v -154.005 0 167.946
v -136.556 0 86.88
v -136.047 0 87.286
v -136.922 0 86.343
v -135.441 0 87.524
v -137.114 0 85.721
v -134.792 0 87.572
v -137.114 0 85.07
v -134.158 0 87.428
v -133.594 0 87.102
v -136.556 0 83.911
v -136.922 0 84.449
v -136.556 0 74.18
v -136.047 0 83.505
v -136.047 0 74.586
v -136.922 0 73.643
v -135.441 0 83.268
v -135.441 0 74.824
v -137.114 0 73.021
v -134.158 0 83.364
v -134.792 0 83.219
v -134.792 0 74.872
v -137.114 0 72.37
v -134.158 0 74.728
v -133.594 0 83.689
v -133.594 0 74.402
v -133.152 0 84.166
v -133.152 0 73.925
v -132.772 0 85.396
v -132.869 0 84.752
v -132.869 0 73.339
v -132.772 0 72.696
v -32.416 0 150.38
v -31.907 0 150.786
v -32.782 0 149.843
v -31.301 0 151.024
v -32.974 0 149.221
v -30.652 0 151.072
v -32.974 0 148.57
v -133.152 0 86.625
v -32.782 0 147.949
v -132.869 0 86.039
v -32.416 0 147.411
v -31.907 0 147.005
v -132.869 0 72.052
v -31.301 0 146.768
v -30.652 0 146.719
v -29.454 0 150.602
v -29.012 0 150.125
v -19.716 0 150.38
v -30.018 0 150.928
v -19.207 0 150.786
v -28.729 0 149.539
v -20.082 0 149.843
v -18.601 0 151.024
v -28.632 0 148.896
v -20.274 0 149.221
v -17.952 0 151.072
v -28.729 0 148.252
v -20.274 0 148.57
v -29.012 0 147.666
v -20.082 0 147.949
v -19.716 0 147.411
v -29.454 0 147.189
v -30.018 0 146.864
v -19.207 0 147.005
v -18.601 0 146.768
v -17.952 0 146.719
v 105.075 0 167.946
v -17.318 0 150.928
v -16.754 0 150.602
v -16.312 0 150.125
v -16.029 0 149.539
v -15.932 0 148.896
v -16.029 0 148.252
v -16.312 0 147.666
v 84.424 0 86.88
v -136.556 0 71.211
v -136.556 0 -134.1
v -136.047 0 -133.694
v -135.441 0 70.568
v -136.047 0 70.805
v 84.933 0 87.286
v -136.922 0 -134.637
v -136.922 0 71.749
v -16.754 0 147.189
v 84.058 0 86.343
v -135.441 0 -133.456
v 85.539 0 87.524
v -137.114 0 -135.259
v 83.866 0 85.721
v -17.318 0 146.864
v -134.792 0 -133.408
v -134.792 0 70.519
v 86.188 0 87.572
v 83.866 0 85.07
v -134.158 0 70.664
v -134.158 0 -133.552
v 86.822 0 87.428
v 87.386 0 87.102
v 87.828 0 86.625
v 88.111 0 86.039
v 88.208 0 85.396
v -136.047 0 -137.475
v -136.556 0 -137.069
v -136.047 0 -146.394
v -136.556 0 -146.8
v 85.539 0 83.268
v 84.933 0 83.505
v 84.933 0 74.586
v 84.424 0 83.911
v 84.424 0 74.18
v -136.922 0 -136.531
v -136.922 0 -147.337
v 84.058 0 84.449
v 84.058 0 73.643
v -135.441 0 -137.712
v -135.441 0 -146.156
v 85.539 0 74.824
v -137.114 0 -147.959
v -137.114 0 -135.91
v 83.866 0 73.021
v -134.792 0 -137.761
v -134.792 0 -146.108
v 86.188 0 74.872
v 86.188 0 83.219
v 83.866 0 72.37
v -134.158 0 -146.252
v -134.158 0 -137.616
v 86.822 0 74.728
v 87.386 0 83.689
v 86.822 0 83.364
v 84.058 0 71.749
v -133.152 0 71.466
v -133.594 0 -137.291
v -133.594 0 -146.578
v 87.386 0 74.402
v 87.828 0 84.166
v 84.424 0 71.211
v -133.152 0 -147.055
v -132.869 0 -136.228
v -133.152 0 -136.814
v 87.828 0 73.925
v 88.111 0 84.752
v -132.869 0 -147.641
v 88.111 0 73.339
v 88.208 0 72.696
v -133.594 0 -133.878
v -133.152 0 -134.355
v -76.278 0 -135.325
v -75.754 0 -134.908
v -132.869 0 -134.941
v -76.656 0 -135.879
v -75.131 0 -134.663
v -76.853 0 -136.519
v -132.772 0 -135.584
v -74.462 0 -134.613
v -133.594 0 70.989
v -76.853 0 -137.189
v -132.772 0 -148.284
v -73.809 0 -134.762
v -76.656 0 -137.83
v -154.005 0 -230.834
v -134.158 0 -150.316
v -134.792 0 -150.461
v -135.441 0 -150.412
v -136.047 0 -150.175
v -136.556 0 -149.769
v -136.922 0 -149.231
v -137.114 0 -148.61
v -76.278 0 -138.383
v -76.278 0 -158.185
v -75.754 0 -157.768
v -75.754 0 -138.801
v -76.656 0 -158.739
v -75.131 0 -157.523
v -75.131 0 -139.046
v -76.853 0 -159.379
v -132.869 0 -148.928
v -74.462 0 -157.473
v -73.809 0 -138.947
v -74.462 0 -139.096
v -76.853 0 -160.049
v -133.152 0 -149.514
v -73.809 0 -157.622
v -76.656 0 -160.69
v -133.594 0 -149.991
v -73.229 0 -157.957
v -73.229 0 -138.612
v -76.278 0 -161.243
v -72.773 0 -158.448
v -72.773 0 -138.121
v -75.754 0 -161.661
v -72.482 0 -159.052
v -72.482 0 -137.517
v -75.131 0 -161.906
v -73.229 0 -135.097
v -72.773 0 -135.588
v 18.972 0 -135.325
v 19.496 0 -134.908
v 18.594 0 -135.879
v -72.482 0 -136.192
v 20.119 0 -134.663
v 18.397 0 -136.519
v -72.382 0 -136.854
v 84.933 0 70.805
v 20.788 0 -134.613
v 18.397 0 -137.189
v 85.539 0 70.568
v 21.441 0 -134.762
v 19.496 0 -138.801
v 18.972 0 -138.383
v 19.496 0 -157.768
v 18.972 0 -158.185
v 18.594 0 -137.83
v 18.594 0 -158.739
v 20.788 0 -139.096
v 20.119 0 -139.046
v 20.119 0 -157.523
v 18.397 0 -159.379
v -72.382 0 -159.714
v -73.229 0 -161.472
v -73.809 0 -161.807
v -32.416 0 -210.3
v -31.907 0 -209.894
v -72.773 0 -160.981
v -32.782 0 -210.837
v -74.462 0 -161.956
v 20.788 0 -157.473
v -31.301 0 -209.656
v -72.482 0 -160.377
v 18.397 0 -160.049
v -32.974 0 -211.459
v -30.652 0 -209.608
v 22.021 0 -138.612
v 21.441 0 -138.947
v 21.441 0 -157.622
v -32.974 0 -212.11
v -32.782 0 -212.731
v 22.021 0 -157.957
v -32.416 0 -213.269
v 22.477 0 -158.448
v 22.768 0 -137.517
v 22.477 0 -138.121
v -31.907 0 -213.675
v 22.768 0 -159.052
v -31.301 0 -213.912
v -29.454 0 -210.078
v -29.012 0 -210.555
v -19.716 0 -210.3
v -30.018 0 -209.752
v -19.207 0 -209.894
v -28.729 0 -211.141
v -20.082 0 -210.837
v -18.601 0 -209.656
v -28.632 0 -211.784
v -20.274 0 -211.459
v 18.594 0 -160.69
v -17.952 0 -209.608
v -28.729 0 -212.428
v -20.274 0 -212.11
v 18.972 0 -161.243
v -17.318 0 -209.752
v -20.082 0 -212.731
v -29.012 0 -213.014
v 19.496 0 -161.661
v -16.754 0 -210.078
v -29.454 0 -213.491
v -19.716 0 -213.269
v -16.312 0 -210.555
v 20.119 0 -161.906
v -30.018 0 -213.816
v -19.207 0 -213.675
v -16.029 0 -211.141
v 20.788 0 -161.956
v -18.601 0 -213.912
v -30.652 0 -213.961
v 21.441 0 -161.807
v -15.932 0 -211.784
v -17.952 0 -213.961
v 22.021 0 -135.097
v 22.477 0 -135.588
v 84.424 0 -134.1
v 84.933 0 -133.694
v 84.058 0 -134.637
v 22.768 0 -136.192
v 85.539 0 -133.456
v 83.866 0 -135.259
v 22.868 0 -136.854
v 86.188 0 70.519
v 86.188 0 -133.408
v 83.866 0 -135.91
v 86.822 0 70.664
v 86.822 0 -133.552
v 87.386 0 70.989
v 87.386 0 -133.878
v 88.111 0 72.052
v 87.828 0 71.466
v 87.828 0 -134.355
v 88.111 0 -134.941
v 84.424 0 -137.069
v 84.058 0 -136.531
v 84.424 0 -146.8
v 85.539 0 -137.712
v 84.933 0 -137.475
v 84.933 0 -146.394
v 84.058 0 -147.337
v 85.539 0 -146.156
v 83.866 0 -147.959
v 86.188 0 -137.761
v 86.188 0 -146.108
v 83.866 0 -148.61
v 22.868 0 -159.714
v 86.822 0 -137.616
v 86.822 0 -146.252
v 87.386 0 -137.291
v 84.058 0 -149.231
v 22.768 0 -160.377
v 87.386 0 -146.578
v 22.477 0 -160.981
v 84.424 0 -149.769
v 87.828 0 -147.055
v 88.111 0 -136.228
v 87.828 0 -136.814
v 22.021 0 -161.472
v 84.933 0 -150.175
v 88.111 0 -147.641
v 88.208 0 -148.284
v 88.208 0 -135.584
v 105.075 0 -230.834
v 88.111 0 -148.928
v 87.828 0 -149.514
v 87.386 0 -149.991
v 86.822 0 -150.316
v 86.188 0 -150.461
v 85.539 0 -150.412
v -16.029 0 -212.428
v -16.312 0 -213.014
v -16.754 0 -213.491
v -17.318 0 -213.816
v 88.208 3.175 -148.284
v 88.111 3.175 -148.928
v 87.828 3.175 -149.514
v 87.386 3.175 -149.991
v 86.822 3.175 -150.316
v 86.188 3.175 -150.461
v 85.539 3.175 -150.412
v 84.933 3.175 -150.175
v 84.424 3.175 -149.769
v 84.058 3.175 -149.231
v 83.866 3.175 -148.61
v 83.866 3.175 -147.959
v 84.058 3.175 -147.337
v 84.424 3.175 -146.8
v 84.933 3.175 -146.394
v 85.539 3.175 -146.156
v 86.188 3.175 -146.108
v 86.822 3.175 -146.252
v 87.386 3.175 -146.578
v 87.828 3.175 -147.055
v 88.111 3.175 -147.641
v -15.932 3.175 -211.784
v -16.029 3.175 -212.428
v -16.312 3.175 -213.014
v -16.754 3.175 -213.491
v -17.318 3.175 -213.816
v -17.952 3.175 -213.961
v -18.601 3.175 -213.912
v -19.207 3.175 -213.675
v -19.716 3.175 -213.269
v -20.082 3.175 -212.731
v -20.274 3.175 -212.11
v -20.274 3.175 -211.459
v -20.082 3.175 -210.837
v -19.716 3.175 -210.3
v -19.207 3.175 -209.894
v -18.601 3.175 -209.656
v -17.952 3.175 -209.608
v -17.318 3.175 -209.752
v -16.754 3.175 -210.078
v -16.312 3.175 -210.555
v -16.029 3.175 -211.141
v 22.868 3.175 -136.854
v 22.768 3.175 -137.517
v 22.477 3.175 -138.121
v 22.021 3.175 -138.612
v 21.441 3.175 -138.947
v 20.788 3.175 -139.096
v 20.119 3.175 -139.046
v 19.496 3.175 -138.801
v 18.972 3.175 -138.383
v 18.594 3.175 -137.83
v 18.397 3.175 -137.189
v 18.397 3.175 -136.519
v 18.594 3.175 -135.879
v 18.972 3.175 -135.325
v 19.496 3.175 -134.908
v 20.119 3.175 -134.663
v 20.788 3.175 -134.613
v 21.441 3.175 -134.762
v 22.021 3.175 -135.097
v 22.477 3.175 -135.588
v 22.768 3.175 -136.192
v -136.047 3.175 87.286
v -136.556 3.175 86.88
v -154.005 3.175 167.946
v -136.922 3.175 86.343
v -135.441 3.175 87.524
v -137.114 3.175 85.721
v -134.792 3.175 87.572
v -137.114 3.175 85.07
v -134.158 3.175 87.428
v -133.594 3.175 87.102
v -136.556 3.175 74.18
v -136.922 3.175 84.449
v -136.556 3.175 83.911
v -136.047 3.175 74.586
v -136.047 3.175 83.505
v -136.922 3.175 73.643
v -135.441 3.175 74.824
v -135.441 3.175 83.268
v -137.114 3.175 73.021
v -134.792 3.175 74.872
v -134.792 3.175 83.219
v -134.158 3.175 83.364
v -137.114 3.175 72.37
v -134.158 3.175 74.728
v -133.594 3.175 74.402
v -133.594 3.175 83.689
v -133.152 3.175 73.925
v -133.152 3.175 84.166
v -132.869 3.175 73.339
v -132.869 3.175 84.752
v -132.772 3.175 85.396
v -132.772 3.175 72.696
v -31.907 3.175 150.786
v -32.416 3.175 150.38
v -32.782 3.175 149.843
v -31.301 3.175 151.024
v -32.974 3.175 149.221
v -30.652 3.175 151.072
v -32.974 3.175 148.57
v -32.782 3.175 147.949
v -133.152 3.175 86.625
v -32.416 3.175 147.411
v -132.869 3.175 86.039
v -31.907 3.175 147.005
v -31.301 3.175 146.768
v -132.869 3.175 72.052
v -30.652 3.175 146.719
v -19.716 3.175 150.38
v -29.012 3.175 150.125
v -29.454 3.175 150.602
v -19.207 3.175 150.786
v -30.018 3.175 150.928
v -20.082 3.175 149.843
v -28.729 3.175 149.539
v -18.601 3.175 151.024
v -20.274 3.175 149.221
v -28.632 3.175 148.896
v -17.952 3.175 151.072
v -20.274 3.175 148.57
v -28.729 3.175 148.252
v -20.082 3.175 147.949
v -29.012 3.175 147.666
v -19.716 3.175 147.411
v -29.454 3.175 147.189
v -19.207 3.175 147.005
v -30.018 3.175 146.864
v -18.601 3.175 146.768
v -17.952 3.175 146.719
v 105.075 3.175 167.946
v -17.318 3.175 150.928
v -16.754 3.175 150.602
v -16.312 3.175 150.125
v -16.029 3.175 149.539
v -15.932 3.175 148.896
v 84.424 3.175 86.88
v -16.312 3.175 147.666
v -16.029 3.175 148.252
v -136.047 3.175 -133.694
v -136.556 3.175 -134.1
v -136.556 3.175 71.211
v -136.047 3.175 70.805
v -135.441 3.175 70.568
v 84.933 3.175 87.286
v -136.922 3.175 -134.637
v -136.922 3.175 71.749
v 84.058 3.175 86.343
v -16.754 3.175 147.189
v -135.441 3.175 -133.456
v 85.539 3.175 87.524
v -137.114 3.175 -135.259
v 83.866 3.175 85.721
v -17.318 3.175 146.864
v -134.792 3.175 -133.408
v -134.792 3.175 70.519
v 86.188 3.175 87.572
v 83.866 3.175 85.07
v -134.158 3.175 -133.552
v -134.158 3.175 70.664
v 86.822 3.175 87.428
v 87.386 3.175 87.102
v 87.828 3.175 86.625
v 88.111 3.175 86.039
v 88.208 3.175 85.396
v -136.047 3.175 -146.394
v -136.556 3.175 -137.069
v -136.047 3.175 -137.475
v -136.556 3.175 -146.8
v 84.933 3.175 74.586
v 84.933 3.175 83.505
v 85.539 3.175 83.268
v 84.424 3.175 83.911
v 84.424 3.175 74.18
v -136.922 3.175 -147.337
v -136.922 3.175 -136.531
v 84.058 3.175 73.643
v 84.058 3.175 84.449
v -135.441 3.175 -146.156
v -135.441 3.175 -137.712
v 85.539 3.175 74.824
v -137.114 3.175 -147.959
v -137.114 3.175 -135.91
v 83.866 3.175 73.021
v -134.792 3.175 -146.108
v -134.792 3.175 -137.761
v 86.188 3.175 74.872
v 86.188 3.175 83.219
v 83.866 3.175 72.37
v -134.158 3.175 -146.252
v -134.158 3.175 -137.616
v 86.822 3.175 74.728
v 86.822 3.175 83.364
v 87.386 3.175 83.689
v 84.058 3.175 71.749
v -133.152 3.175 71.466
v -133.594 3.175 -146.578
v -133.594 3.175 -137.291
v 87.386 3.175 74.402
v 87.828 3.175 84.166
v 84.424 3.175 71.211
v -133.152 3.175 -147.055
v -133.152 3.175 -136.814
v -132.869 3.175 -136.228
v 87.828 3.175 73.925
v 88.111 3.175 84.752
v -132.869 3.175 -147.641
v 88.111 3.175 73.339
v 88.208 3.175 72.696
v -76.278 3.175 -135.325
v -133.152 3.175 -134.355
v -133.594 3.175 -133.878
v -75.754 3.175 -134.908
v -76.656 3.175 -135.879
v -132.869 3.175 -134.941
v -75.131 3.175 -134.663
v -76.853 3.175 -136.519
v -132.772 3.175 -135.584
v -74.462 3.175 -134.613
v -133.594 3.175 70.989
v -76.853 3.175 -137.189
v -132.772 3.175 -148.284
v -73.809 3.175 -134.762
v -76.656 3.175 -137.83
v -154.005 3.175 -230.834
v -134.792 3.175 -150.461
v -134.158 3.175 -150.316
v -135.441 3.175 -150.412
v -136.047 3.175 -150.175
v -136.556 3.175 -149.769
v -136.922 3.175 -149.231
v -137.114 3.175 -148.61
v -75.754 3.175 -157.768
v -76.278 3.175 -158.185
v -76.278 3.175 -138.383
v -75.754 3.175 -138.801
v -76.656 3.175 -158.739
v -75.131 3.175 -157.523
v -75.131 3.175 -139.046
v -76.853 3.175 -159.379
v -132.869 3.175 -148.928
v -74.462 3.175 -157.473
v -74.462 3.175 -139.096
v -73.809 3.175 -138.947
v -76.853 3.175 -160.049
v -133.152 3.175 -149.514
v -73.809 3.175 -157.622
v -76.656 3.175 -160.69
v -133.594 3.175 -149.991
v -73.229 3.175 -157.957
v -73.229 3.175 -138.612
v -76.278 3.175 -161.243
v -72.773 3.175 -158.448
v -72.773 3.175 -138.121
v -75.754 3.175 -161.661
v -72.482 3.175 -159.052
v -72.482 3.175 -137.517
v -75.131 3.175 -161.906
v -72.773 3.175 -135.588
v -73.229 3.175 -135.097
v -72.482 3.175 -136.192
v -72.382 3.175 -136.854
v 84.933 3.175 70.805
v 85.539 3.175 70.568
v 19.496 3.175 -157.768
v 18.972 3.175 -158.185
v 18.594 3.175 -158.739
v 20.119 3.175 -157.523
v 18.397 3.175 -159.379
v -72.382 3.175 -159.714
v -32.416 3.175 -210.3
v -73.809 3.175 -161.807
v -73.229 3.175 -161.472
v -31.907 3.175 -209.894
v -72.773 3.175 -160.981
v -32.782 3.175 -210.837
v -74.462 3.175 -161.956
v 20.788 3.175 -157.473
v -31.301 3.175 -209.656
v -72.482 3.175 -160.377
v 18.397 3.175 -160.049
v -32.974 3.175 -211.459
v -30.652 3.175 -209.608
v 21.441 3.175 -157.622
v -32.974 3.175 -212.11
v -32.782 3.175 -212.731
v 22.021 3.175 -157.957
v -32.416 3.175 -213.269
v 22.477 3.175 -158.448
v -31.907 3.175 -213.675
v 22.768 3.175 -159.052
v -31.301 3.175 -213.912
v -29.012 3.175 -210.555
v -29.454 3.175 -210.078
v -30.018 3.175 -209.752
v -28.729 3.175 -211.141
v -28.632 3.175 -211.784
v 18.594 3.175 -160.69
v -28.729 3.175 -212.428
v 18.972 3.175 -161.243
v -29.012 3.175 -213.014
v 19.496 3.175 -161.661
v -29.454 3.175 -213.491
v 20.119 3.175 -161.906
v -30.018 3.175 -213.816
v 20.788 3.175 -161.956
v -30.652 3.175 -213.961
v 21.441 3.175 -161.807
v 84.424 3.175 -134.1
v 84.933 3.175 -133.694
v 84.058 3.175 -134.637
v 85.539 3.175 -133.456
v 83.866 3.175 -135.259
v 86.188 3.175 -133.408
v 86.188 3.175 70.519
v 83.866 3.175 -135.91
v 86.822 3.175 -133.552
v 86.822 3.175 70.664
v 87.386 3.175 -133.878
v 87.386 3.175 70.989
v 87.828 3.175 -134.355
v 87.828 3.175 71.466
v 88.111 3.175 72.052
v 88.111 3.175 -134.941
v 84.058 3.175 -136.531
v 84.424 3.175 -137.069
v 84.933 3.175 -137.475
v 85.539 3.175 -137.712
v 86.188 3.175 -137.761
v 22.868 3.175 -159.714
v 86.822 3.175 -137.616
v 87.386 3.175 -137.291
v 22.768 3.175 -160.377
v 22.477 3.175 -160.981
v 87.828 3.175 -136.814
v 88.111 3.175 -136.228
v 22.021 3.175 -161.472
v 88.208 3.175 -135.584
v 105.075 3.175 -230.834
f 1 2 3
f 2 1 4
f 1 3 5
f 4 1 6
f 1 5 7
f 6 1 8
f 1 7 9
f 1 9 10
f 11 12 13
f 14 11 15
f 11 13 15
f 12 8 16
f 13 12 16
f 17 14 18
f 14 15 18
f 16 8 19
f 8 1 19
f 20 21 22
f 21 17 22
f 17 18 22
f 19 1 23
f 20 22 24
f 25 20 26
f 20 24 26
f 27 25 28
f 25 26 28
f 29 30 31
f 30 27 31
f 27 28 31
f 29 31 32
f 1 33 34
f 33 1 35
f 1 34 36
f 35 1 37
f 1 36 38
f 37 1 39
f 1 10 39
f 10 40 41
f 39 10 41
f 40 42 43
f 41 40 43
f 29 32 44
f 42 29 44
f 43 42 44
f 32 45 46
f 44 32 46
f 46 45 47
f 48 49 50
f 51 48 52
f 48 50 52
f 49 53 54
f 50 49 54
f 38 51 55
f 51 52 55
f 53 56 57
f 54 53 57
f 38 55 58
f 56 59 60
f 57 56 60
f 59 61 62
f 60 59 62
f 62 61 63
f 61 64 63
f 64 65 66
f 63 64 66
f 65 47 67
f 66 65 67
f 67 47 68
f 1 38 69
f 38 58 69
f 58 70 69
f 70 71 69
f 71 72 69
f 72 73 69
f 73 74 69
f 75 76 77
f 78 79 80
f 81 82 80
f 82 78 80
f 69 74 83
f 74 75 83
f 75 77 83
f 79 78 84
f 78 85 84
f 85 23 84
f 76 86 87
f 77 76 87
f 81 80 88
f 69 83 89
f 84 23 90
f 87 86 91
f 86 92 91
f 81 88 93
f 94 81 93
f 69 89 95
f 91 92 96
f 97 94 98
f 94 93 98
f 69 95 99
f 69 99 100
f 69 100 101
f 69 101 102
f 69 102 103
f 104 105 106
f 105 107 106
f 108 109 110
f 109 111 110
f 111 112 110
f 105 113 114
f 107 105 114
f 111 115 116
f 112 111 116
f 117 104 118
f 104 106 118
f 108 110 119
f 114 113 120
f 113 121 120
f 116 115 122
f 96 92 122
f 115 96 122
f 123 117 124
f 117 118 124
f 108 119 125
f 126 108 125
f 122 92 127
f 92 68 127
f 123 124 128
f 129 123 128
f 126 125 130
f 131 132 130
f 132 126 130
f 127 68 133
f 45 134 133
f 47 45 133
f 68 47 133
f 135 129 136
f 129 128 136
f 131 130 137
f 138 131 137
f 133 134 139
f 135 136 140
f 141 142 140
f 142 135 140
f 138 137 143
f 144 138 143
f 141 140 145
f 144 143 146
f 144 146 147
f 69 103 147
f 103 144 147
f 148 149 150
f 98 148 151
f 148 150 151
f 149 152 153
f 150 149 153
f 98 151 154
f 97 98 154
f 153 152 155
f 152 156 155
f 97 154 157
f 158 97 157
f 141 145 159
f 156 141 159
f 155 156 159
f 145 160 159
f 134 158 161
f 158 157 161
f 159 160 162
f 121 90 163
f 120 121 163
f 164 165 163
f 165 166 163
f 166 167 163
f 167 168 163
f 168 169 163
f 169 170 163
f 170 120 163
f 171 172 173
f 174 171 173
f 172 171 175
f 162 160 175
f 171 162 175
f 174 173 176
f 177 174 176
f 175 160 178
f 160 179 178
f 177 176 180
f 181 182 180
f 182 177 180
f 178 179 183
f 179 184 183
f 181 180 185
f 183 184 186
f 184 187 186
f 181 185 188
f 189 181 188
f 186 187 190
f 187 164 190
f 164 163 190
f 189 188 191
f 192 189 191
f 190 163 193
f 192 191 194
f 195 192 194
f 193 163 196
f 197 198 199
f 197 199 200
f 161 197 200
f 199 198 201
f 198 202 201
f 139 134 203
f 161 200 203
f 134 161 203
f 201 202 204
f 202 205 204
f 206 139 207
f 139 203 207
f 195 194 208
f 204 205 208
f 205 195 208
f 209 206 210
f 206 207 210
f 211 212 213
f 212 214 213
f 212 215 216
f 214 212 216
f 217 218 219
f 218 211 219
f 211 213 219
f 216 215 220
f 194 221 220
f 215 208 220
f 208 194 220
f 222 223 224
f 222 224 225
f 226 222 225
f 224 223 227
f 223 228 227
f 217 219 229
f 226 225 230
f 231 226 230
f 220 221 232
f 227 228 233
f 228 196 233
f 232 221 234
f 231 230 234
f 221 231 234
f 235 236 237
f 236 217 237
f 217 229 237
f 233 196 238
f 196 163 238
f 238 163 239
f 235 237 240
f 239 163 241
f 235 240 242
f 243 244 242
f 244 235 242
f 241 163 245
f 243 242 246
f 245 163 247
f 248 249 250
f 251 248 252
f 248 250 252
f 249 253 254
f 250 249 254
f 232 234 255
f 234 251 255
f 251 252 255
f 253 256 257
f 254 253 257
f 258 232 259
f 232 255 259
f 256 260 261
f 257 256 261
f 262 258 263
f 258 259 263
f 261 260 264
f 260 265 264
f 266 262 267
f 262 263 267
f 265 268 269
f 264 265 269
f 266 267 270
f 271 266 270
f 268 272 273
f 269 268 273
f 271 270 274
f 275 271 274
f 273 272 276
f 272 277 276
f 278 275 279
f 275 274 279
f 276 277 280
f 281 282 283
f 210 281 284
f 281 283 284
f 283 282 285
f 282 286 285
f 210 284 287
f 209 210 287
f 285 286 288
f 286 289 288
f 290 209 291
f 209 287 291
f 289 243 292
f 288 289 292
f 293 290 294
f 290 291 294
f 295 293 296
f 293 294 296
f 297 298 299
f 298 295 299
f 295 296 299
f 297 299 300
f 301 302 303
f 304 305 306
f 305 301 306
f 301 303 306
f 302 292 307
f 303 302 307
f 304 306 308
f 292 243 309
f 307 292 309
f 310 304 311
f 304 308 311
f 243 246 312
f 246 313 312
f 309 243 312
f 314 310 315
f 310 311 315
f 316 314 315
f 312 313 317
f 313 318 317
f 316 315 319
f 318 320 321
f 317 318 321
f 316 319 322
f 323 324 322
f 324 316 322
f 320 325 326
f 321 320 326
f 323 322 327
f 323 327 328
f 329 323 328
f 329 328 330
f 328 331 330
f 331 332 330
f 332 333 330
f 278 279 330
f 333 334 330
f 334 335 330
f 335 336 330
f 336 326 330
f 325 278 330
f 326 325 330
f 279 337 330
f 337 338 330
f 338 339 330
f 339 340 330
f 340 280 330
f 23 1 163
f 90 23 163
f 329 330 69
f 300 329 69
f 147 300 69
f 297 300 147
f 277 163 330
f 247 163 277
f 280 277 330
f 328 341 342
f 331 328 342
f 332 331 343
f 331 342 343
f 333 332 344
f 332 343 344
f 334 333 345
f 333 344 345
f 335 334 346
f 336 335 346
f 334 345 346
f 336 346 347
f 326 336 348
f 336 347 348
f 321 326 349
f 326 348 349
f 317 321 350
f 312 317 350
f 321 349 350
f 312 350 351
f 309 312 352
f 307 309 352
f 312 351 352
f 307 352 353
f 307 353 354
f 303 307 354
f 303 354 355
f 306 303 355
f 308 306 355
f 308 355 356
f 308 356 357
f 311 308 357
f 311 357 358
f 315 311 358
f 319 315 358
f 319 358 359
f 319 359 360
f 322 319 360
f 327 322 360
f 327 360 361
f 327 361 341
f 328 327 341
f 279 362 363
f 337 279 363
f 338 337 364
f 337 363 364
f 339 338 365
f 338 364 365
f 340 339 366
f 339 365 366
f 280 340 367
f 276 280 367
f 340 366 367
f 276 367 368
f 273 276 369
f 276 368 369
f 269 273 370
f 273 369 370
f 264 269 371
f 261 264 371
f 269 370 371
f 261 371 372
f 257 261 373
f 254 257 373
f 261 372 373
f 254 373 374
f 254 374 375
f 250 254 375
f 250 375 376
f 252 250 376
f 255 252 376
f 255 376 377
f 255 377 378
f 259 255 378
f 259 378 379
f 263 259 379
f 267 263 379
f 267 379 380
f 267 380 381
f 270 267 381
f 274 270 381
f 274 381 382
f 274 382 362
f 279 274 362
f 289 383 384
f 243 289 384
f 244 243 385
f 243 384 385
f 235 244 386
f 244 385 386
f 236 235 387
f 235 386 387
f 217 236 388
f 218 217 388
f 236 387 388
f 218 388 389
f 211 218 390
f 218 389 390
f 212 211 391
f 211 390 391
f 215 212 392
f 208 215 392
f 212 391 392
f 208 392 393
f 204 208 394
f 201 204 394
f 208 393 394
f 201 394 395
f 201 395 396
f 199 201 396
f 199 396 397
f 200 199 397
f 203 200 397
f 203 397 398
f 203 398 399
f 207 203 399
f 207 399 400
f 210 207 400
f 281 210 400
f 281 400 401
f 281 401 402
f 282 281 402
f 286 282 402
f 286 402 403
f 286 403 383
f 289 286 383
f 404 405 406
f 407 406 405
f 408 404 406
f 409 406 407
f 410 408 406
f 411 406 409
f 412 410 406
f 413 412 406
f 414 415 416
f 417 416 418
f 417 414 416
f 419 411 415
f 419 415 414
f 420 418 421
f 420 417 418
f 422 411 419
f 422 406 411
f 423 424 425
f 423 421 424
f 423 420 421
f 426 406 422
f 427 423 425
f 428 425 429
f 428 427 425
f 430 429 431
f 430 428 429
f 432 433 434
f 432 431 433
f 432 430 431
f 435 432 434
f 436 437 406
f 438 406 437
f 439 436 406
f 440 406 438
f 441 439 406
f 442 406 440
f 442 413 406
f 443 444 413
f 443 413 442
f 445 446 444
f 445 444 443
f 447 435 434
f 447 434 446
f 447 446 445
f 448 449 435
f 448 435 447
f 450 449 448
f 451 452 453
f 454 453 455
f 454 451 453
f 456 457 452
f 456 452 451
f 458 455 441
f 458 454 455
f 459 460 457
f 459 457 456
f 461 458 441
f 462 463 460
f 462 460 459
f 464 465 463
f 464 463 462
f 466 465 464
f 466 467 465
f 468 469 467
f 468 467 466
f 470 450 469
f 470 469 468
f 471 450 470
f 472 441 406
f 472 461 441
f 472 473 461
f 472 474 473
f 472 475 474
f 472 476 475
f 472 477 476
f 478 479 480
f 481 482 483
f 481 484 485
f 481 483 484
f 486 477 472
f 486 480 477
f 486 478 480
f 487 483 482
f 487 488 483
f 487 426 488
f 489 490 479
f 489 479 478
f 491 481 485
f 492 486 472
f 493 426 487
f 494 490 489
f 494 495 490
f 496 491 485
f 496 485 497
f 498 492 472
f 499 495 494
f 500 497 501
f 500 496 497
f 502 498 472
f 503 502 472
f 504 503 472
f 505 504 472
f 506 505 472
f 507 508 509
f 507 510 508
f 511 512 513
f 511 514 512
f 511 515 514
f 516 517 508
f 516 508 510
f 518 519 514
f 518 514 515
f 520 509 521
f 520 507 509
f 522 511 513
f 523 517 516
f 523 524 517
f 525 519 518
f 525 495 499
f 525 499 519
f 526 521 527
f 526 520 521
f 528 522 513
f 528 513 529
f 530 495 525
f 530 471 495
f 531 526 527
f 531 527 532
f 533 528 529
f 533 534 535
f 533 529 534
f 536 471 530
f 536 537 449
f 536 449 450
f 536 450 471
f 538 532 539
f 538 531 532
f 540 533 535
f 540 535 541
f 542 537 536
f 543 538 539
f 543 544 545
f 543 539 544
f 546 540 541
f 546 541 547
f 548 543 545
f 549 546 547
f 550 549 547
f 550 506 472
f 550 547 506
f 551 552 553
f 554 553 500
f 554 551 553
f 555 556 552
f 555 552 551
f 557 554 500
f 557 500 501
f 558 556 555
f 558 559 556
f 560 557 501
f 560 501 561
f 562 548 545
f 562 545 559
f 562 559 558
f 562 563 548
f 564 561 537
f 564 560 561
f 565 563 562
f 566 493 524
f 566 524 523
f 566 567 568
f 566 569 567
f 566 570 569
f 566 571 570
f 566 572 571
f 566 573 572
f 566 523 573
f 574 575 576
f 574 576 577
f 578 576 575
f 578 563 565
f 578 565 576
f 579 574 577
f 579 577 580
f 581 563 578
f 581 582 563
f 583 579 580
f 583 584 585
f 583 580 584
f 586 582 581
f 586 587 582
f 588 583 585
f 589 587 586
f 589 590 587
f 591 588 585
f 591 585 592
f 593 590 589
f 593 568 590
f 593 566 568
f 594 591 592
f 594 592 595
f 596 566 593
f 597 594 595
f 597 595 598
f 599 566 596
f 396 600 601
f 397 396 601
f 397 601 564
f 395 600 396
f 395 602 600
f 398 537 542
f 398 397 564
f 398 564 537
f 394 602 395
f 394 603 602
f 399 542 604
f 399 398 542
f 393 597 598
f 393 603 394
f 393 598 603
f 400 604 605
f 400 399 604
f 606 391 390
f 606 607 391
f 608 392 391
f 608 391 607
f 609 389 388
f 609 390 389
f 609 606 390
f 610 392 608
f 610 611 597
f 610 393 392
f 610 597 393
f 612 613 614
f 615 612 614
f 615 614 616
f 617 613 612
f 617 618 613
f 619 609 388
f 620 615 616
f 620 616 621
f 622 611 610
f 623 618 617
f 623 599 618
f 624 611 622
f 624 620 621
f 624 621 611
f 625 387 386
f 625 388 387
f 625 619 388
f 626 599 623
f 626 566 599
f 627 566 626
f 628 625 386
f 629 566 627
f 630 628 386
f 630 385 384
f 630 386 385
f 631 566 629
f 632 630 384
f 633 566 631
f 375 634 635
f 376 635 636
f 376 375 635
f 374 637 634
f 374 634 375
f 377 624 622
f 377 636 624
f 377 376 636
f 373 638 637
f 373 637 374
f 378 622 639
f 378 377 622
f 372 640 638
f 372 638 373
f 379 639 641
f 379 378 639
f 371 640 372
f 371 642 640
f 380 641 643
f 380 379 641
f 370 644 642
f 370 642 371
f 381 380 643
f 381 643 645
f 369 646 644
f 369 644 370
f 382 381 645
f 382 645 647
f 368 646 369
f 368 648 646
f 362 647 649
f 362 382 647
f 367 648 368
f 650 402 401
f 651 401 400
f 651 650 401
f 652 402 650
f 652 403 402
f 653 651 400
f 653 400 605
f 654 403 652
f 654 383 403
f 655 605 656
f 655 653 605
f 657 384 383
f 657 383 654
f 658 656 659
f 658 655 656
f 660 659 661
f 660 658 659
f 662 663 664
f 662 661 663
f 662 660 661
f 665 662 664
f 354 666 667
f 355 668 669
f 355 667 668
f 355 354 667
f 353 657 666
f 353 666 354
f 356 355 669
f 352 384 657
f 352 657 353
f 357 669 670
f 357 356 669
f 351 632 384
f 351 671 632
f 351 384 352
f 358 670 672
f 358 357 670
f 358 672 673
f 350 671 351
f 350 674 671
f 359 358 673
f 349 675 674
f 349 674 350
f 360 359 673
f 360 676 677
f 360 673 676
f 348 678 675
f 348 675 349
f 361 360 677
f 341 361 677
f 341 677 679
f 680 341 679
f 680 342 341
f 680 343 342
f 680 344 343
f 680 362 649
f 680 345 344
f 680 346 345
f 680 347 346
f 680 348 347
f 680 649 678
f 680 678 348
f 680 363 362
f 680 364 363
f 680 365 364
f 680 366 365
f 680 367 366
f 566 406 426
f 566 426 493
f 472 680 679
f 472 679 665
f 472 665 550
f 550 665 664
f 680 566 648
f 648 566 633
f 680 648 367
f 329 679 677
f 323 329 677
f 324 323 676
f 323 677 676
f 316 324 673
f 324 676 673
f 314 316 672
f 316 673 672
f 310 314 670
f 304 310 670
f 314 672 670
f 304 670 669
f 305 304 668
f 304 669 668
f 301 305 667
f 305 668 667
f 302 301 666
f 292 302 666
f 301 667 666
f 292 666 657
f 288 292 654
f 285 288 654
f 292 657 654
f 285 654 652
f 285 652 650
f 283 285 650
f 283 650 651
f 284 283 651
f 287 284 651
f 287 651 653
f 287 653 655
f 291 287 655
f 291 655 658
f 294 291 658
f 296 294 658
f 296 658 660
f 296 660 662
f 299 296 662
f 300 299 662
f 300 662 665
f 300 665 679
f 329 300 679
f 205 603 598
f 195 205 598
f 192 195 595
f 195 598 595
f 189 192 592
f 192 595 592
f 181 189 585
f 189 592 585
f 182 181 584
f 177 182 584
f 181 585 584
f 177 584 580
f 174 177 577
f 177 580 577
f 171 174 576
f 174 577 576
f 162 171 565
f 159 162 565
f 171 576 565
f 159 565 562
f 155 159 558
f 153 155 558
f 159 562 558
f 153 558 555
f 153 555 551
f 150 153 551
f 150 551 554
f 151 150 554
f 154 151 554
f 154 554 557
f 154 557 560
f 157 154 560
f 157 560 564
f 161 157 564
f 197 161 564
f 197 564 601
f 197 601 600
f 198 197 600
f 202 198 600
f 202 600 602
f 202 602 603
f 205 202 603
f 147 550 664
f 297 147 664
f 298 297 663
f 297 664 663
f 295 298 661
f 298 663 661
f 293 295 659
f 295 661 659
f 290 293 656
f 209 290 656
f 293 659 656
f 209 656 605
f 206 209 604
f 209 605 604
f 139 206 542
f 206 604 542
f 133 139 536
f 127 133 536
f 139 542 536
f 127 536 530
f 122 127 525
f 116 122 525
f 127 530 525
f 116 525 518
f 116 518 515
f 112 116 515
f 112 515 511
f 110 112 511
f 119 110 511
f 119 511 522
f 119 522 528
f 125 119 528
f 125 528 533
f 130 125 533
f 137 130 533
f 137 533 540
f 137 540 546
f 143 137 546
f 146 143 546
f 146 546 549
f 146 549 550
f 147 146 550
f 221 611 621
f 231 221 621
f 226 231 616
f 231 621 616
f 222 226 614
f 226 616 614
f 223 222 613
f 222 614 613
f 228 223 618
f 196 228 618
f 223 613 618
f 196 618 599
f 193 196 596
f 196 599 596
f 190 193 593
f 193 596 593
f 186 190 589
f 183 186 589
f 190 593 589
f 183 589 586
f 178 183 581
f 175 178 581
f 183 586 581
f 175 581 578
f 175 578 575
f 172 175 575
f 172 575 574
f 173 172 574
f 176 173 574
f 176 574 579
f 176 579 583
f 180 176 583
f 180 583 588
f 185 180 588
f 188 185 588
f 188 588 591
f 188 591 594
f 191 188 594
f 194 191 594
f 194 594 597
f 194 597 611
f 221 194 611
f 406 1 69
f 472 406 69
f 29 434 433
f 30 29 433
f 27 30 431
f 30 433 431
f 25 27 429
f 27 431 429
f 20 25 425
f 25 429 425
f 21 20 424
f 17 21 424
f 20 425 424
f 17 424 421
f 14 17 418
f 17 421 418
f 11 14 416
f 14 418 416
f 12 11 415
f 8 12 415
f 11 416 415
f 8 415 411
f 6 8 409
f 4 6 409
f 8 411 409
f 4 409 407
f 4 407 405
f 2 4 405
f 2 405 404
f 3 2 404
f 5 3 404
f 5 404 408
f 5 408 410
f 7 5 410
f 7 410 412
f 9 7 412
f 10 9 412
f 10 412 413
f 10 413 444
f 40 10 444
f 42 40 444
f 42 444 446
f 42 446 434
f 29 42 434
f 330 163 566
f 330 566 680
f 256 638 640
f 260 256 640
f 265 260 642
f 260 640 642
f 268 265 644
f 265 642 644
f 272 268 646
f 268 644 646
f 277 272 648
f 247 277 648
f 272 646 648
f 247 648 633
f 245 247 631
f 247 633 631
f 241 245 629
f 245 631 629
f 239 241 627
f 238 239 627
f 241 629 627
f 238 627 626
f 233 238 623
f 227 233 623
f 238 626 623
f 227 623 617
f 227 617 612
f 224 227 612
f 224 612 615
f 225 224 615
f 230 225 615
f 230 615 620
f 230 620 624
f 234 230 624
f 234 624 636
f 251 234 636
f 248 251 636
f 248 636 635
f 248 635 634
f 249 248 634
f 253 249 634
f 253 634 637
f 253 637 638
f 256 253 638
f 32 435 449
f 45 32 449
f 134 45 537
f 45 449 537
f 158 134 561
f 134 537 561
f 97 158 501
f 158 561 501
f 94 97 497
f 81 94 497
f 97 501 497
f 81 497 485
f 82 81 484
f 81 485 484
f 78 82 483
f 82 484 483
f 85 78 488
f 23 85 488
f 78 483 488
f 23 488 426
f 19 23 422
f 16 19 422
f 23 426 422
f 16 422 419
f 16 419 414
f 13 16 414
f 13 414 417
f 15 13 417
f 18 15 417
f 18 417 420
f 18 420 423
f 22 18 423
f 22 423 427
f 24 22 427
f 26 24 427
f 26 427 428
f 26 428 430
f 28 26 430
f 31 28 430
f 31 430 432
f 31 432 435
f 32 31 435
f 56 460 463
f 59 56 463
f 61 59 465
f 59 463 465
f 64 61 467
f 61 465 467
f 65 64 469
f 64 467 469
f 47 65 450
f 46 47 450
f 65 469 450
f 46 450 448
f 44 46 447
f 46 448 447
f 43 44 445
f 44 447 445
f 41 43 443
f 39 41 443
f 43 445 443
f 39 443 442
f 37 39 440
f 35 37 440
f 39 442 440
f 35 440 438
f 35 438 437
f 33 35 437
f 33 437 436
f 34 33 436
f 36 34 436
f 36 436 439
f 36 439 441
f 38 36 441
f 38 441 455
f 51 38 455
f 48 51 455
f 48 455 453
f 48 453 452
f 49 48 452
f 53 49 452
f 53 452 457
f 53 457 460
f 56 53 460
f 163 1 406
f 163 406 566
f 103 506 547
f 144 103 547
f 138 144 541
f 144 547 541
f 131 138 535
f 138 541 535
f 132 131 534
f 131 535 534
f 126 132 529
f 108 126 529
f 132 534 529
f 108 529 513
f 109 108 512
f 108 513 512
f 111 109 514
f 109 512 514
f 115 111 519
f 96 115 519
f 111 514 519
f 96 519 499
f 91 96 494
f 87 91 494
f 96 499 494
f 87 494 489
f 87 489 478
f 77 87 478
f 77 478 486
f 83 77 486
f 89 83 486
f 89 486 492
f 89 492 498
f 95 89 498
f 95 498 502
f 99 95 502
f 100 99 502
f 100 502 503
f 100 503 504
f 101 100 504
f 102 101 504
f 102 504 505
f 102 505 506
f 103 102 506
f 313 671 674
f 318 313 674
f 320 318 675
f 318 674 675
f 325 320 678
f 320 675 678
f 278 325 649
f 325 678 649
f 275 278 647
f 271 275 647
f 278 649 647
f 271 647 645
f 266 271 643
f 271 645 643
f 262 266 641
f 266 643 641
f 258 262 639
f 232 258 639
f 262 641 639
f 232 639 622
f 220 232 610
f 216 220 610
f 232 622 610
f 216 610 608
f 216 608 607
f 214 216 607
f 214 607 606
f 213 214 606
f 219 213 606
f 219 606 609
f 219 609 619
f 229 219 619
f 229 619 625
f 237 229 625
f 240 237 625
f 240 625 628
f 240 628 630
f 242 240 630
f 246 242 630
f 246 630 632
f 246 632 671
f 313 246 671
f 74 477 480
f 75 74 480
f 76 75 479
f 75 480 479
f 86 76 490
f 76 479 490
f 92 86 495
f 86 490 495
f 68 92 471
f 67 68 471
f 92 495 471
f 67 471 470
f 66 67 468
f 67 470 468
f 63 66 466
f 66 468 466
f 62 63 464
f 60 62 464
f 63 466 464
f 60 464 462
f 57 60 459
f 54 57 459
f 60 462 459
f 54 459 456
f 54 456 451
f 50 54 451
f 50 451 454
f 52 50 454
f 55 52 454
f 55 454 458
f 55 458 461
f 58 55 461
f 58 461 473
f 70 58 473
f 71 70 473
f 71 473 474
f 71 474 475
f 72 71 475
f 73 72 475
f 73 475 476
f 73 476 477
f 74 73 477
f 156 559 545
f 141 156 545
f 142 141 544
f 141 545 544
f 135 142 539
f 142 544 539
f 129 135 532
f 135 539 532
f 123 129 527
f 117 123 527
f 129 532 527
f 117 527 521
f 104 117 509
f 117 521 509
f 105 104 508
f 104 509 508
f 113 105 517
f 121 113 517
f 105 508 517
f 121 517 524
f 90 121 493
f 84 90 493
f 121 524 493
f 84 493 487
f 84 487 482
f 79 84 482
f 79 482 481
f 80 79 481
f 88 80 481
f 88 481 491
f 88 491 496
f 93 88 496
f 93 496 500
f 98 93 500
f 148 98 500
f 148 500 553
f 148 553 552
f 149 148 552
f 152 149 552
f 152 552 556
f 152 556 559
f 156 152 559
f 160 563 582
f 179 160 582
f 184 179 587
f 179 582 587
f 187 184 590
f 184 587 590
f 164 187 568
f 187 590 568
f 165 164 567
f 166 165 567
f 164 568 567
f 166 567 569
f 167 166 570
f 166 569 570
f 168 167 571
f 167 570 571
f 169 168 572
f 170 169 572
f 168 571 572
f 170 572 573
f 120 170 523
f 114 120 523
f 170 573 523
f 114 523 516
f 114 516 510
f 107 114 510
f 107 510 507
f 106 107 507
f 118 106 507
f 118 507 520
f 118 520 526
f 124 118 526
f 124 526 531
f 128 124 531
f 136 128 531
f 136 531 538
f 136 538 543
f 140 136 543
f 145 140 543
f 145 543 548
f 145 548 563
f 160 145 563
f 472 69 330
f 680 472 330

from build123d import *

# Parameters (mm, degrees)
SKETCH1_W                        = 259.08
SKETCH1_H                        = 398.78
BOSS_EXTRUDE1_DEPTH              = 3.175
F_16_0_177_DIAMETER_HOLE1_D      = 4.4958
F_11_64_0_17188_DIAMETER_HOLE1_D = 4.365752


with BuildPart() as part:
    # Sketch1 → Boss-Extrude1 (new body)
    with BuildSketch(Plane(origin=(0, 0, 0), x_dir=(1, 0, 0), z_dir=(0, 1, 0))):
        with Locations((-24.465369934, 31.444323398)):
            Rectangle(SKETCH1_W, SKETCH1_H)
    extrude(amount=BOSS_EXTRUDE1_DEPTH)

    # #16 (0.177) Diameter Hole1 (through all)
    with Locations(Plane(origin=(0, 0, 0), x_dir=(-1, 0, 0), z_dir=(0, -1, 0))):
        with Locations((-20.619630066, 159.714323398), (-20.619630066, 136.854323398), (74.630369934, 136.854323398), (74.630369934, 159.714323398)):
            Hole(F_16_0_177_DIAMETER_HOLE1_D / 2)

    # 11/64 (0.17188) Diameter Hole1 (through all)
    with Locations(Plane(origin=(0, 0, 0), x_dir=(-1, 0, 0), z_dir=(0, -1, 0))):
        with Locations((-86.024630066, 148.284323398), (30.815369934, 211.784323398), (134.955369934, 148.284323398), (134.955369934, -85.395676602), (18.115369934, 211.784323398), (-86.024630066, -85.395676602), (134.955369934, -72.695676602), (134.955369934, 135.584323398), (-86.024630066, 135.584323398), (-86.024630066, -72.695676602), (18.115369934, -148.895676602), (30.815369934, -148.895676602)):
            Hole(F_11_64_0_17188_DIAMETER_HOLE1_D / 2)


solid = part.part
